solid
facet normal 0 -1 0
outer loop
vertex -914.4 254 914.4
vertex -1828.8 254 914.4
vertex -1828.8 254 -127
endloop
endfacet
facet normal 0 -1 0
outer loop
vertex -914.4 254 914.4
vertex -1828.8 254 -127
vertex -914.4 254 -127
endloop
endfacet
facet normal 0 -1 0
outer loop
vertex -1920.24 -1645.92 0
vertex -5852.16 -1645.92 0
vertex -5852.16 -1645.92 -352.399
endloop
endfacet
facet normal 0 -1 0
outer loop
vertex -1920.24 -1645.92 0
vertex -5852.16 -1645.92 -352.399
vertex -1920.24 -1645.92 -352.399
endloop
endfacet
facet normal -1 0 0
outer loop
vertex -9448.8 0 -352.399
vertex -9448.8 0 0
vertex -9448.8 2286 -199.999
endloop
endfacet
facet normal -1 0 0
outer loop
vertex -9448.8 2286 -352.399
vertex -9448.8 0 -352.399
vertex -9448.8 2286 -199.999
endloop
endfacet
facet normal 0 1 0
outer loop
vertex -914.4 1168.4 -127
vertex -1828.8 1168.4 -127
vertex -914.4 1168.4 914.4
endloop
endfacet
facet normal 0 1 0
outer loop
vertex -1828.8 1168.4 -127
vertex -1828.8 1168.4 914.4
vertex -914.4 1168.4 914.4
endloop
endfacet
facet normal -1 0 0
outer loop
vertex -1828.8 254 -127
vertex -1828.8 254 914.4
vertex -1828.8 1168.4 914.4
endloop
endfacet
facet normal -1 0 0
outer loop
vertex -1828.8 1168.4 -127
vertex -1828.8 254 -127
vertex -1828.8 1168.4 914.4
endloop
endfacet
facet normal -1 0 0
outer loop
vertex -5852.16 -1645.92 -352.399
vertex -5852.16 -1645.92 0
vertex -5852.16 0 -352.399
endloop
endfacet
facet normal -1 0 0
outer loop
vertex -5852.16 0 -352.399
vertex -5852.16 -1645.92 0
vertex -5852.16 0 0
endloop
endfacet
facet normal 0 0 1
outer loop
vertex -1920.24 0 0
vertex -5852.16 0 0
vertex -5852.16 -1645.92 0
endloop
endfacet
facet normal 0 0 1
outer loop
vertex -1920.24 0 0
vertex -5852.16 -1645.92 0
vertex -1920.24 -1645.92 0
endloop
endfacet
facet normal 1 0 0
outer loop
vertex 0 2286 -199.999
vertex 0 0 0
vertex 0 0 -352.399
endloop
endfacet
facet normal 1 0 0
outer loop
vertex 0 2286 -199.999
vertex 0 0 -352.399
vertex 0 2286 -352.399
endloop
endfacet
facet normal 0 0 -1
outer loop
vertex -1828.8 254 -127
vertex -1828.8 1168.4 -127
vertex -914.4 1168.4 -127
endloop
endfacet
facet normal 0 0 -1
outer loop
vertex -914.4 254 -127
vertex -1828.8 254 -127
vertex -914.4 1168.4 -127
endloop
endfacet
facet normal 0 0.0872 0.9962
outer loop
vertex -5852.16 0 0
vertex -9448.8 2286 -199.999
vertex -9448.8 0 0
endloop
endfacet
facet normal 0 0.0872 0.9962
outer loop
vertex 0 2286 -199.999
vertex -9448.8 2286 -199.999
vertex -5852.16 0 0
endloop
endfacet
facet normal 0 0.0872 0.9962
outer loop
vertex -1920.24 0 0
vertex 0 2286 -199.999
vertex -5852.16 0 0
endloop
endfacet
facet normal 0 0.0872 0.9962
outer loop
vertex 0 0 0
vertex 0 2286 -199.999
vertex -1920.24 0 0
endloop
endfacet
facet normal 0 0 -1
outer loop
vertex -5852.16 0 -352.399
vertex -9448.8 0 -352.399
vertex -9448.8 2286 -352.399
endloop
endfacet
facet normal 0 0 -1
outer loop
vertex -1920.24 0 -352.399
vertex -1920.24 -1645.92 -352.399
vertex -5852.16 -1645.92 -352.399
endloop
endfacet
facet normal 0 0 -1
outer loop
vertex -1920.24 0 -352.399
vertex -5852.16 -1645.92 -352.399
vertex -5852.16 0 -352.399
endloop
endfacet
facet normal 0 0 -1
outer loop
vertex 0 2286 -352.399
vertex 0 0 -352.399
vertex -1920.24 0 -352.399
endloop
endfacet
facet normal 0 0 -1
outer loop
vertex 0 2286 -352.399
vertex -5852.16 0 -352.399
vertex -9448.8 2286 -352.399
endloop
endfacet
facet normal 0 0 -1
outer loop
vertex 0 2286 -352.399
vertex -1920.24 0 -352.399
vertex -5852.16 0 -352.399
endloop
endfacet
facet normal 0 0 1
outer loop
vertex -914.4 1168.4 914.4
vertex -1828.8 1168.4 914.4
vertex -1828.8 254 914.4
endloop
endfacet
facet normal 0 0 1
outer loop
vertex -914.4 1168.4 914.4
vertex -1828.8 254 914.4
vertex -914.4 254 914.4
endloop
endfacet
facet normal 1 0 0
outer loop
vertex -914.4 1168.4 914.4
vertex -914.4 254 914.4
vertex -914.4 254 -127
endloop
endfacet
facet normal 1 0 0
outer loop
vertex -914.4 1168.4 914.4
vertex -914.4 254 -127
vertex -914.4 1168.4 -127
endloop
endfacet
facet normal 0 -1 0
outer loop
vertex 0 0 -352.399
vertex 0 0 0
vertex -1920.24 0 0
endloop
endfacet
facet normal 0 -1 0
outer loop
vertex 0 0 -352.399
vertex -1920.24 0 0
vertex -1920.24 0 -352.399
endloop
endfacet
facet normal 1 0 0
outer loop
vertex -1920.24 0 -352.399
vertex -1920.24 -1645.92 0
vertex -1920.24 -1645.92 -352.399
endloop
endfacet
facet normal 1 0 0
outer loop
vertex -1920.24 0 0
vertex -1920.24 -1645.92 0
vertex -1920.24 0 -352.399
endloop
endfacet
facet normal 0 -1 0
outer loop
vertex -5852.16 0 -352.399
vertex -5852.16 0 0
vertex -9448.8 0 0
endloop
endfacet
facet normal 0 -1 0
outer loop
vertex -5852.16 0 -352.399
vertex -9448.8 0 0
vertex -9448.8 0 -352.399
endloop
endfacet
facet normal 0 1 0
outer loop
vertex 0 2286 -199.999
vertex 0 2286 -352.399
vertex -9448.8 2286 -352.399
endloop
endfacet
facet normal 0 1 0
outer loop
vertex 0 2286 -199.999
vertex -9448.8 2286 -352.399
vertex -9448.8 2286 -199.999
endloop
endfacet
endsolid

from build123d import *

# Parameters (mm, degrees)
F1_DEPTH      = 9448.8
F2_W          = 3931.92
F2_H          = 1645.92
F3_DEPTH      = 352.399085
F4_W          = 914.4
F4_H          = 914.4
F5_DEPTH      = 914.4
F5_DEPTH_BACK = 127


with BuildPart() as f1:
    # F0 (on Right) → F1 (new body)
    with BuildSketch(Plane.YZ):
        Polygon((2286, -199.999085), (0, 0), (0, -199.999085), (0, -352.399085), (2286, -352.399085), align=None)
    extrude(amount=-F1_DEPTH)

    # F2 (on Top) → F3 (join, through all)
    with BuildSketch(Plane.XY):
        with Locations((-3886.2, -822.96)):
            Rectangle(F2_W, F2_H)
    extrude(amount=-F3_DEPTH)


with BuildPart() as f5:
    # F4 (on Top) → F5 (new body, two sides)
    with BuildSketch(Plane.XY) as f5_sk:
        with Locations((-1371.6, 711.2)):
            Rectangle(F4_W, F4_H)
    extrude(amount=F5_DEPTH)
    extrude(f5_sk.sketch, amount=-F5_DEPTH_BACK)


solid = Compound([f1.part, f5.part])
